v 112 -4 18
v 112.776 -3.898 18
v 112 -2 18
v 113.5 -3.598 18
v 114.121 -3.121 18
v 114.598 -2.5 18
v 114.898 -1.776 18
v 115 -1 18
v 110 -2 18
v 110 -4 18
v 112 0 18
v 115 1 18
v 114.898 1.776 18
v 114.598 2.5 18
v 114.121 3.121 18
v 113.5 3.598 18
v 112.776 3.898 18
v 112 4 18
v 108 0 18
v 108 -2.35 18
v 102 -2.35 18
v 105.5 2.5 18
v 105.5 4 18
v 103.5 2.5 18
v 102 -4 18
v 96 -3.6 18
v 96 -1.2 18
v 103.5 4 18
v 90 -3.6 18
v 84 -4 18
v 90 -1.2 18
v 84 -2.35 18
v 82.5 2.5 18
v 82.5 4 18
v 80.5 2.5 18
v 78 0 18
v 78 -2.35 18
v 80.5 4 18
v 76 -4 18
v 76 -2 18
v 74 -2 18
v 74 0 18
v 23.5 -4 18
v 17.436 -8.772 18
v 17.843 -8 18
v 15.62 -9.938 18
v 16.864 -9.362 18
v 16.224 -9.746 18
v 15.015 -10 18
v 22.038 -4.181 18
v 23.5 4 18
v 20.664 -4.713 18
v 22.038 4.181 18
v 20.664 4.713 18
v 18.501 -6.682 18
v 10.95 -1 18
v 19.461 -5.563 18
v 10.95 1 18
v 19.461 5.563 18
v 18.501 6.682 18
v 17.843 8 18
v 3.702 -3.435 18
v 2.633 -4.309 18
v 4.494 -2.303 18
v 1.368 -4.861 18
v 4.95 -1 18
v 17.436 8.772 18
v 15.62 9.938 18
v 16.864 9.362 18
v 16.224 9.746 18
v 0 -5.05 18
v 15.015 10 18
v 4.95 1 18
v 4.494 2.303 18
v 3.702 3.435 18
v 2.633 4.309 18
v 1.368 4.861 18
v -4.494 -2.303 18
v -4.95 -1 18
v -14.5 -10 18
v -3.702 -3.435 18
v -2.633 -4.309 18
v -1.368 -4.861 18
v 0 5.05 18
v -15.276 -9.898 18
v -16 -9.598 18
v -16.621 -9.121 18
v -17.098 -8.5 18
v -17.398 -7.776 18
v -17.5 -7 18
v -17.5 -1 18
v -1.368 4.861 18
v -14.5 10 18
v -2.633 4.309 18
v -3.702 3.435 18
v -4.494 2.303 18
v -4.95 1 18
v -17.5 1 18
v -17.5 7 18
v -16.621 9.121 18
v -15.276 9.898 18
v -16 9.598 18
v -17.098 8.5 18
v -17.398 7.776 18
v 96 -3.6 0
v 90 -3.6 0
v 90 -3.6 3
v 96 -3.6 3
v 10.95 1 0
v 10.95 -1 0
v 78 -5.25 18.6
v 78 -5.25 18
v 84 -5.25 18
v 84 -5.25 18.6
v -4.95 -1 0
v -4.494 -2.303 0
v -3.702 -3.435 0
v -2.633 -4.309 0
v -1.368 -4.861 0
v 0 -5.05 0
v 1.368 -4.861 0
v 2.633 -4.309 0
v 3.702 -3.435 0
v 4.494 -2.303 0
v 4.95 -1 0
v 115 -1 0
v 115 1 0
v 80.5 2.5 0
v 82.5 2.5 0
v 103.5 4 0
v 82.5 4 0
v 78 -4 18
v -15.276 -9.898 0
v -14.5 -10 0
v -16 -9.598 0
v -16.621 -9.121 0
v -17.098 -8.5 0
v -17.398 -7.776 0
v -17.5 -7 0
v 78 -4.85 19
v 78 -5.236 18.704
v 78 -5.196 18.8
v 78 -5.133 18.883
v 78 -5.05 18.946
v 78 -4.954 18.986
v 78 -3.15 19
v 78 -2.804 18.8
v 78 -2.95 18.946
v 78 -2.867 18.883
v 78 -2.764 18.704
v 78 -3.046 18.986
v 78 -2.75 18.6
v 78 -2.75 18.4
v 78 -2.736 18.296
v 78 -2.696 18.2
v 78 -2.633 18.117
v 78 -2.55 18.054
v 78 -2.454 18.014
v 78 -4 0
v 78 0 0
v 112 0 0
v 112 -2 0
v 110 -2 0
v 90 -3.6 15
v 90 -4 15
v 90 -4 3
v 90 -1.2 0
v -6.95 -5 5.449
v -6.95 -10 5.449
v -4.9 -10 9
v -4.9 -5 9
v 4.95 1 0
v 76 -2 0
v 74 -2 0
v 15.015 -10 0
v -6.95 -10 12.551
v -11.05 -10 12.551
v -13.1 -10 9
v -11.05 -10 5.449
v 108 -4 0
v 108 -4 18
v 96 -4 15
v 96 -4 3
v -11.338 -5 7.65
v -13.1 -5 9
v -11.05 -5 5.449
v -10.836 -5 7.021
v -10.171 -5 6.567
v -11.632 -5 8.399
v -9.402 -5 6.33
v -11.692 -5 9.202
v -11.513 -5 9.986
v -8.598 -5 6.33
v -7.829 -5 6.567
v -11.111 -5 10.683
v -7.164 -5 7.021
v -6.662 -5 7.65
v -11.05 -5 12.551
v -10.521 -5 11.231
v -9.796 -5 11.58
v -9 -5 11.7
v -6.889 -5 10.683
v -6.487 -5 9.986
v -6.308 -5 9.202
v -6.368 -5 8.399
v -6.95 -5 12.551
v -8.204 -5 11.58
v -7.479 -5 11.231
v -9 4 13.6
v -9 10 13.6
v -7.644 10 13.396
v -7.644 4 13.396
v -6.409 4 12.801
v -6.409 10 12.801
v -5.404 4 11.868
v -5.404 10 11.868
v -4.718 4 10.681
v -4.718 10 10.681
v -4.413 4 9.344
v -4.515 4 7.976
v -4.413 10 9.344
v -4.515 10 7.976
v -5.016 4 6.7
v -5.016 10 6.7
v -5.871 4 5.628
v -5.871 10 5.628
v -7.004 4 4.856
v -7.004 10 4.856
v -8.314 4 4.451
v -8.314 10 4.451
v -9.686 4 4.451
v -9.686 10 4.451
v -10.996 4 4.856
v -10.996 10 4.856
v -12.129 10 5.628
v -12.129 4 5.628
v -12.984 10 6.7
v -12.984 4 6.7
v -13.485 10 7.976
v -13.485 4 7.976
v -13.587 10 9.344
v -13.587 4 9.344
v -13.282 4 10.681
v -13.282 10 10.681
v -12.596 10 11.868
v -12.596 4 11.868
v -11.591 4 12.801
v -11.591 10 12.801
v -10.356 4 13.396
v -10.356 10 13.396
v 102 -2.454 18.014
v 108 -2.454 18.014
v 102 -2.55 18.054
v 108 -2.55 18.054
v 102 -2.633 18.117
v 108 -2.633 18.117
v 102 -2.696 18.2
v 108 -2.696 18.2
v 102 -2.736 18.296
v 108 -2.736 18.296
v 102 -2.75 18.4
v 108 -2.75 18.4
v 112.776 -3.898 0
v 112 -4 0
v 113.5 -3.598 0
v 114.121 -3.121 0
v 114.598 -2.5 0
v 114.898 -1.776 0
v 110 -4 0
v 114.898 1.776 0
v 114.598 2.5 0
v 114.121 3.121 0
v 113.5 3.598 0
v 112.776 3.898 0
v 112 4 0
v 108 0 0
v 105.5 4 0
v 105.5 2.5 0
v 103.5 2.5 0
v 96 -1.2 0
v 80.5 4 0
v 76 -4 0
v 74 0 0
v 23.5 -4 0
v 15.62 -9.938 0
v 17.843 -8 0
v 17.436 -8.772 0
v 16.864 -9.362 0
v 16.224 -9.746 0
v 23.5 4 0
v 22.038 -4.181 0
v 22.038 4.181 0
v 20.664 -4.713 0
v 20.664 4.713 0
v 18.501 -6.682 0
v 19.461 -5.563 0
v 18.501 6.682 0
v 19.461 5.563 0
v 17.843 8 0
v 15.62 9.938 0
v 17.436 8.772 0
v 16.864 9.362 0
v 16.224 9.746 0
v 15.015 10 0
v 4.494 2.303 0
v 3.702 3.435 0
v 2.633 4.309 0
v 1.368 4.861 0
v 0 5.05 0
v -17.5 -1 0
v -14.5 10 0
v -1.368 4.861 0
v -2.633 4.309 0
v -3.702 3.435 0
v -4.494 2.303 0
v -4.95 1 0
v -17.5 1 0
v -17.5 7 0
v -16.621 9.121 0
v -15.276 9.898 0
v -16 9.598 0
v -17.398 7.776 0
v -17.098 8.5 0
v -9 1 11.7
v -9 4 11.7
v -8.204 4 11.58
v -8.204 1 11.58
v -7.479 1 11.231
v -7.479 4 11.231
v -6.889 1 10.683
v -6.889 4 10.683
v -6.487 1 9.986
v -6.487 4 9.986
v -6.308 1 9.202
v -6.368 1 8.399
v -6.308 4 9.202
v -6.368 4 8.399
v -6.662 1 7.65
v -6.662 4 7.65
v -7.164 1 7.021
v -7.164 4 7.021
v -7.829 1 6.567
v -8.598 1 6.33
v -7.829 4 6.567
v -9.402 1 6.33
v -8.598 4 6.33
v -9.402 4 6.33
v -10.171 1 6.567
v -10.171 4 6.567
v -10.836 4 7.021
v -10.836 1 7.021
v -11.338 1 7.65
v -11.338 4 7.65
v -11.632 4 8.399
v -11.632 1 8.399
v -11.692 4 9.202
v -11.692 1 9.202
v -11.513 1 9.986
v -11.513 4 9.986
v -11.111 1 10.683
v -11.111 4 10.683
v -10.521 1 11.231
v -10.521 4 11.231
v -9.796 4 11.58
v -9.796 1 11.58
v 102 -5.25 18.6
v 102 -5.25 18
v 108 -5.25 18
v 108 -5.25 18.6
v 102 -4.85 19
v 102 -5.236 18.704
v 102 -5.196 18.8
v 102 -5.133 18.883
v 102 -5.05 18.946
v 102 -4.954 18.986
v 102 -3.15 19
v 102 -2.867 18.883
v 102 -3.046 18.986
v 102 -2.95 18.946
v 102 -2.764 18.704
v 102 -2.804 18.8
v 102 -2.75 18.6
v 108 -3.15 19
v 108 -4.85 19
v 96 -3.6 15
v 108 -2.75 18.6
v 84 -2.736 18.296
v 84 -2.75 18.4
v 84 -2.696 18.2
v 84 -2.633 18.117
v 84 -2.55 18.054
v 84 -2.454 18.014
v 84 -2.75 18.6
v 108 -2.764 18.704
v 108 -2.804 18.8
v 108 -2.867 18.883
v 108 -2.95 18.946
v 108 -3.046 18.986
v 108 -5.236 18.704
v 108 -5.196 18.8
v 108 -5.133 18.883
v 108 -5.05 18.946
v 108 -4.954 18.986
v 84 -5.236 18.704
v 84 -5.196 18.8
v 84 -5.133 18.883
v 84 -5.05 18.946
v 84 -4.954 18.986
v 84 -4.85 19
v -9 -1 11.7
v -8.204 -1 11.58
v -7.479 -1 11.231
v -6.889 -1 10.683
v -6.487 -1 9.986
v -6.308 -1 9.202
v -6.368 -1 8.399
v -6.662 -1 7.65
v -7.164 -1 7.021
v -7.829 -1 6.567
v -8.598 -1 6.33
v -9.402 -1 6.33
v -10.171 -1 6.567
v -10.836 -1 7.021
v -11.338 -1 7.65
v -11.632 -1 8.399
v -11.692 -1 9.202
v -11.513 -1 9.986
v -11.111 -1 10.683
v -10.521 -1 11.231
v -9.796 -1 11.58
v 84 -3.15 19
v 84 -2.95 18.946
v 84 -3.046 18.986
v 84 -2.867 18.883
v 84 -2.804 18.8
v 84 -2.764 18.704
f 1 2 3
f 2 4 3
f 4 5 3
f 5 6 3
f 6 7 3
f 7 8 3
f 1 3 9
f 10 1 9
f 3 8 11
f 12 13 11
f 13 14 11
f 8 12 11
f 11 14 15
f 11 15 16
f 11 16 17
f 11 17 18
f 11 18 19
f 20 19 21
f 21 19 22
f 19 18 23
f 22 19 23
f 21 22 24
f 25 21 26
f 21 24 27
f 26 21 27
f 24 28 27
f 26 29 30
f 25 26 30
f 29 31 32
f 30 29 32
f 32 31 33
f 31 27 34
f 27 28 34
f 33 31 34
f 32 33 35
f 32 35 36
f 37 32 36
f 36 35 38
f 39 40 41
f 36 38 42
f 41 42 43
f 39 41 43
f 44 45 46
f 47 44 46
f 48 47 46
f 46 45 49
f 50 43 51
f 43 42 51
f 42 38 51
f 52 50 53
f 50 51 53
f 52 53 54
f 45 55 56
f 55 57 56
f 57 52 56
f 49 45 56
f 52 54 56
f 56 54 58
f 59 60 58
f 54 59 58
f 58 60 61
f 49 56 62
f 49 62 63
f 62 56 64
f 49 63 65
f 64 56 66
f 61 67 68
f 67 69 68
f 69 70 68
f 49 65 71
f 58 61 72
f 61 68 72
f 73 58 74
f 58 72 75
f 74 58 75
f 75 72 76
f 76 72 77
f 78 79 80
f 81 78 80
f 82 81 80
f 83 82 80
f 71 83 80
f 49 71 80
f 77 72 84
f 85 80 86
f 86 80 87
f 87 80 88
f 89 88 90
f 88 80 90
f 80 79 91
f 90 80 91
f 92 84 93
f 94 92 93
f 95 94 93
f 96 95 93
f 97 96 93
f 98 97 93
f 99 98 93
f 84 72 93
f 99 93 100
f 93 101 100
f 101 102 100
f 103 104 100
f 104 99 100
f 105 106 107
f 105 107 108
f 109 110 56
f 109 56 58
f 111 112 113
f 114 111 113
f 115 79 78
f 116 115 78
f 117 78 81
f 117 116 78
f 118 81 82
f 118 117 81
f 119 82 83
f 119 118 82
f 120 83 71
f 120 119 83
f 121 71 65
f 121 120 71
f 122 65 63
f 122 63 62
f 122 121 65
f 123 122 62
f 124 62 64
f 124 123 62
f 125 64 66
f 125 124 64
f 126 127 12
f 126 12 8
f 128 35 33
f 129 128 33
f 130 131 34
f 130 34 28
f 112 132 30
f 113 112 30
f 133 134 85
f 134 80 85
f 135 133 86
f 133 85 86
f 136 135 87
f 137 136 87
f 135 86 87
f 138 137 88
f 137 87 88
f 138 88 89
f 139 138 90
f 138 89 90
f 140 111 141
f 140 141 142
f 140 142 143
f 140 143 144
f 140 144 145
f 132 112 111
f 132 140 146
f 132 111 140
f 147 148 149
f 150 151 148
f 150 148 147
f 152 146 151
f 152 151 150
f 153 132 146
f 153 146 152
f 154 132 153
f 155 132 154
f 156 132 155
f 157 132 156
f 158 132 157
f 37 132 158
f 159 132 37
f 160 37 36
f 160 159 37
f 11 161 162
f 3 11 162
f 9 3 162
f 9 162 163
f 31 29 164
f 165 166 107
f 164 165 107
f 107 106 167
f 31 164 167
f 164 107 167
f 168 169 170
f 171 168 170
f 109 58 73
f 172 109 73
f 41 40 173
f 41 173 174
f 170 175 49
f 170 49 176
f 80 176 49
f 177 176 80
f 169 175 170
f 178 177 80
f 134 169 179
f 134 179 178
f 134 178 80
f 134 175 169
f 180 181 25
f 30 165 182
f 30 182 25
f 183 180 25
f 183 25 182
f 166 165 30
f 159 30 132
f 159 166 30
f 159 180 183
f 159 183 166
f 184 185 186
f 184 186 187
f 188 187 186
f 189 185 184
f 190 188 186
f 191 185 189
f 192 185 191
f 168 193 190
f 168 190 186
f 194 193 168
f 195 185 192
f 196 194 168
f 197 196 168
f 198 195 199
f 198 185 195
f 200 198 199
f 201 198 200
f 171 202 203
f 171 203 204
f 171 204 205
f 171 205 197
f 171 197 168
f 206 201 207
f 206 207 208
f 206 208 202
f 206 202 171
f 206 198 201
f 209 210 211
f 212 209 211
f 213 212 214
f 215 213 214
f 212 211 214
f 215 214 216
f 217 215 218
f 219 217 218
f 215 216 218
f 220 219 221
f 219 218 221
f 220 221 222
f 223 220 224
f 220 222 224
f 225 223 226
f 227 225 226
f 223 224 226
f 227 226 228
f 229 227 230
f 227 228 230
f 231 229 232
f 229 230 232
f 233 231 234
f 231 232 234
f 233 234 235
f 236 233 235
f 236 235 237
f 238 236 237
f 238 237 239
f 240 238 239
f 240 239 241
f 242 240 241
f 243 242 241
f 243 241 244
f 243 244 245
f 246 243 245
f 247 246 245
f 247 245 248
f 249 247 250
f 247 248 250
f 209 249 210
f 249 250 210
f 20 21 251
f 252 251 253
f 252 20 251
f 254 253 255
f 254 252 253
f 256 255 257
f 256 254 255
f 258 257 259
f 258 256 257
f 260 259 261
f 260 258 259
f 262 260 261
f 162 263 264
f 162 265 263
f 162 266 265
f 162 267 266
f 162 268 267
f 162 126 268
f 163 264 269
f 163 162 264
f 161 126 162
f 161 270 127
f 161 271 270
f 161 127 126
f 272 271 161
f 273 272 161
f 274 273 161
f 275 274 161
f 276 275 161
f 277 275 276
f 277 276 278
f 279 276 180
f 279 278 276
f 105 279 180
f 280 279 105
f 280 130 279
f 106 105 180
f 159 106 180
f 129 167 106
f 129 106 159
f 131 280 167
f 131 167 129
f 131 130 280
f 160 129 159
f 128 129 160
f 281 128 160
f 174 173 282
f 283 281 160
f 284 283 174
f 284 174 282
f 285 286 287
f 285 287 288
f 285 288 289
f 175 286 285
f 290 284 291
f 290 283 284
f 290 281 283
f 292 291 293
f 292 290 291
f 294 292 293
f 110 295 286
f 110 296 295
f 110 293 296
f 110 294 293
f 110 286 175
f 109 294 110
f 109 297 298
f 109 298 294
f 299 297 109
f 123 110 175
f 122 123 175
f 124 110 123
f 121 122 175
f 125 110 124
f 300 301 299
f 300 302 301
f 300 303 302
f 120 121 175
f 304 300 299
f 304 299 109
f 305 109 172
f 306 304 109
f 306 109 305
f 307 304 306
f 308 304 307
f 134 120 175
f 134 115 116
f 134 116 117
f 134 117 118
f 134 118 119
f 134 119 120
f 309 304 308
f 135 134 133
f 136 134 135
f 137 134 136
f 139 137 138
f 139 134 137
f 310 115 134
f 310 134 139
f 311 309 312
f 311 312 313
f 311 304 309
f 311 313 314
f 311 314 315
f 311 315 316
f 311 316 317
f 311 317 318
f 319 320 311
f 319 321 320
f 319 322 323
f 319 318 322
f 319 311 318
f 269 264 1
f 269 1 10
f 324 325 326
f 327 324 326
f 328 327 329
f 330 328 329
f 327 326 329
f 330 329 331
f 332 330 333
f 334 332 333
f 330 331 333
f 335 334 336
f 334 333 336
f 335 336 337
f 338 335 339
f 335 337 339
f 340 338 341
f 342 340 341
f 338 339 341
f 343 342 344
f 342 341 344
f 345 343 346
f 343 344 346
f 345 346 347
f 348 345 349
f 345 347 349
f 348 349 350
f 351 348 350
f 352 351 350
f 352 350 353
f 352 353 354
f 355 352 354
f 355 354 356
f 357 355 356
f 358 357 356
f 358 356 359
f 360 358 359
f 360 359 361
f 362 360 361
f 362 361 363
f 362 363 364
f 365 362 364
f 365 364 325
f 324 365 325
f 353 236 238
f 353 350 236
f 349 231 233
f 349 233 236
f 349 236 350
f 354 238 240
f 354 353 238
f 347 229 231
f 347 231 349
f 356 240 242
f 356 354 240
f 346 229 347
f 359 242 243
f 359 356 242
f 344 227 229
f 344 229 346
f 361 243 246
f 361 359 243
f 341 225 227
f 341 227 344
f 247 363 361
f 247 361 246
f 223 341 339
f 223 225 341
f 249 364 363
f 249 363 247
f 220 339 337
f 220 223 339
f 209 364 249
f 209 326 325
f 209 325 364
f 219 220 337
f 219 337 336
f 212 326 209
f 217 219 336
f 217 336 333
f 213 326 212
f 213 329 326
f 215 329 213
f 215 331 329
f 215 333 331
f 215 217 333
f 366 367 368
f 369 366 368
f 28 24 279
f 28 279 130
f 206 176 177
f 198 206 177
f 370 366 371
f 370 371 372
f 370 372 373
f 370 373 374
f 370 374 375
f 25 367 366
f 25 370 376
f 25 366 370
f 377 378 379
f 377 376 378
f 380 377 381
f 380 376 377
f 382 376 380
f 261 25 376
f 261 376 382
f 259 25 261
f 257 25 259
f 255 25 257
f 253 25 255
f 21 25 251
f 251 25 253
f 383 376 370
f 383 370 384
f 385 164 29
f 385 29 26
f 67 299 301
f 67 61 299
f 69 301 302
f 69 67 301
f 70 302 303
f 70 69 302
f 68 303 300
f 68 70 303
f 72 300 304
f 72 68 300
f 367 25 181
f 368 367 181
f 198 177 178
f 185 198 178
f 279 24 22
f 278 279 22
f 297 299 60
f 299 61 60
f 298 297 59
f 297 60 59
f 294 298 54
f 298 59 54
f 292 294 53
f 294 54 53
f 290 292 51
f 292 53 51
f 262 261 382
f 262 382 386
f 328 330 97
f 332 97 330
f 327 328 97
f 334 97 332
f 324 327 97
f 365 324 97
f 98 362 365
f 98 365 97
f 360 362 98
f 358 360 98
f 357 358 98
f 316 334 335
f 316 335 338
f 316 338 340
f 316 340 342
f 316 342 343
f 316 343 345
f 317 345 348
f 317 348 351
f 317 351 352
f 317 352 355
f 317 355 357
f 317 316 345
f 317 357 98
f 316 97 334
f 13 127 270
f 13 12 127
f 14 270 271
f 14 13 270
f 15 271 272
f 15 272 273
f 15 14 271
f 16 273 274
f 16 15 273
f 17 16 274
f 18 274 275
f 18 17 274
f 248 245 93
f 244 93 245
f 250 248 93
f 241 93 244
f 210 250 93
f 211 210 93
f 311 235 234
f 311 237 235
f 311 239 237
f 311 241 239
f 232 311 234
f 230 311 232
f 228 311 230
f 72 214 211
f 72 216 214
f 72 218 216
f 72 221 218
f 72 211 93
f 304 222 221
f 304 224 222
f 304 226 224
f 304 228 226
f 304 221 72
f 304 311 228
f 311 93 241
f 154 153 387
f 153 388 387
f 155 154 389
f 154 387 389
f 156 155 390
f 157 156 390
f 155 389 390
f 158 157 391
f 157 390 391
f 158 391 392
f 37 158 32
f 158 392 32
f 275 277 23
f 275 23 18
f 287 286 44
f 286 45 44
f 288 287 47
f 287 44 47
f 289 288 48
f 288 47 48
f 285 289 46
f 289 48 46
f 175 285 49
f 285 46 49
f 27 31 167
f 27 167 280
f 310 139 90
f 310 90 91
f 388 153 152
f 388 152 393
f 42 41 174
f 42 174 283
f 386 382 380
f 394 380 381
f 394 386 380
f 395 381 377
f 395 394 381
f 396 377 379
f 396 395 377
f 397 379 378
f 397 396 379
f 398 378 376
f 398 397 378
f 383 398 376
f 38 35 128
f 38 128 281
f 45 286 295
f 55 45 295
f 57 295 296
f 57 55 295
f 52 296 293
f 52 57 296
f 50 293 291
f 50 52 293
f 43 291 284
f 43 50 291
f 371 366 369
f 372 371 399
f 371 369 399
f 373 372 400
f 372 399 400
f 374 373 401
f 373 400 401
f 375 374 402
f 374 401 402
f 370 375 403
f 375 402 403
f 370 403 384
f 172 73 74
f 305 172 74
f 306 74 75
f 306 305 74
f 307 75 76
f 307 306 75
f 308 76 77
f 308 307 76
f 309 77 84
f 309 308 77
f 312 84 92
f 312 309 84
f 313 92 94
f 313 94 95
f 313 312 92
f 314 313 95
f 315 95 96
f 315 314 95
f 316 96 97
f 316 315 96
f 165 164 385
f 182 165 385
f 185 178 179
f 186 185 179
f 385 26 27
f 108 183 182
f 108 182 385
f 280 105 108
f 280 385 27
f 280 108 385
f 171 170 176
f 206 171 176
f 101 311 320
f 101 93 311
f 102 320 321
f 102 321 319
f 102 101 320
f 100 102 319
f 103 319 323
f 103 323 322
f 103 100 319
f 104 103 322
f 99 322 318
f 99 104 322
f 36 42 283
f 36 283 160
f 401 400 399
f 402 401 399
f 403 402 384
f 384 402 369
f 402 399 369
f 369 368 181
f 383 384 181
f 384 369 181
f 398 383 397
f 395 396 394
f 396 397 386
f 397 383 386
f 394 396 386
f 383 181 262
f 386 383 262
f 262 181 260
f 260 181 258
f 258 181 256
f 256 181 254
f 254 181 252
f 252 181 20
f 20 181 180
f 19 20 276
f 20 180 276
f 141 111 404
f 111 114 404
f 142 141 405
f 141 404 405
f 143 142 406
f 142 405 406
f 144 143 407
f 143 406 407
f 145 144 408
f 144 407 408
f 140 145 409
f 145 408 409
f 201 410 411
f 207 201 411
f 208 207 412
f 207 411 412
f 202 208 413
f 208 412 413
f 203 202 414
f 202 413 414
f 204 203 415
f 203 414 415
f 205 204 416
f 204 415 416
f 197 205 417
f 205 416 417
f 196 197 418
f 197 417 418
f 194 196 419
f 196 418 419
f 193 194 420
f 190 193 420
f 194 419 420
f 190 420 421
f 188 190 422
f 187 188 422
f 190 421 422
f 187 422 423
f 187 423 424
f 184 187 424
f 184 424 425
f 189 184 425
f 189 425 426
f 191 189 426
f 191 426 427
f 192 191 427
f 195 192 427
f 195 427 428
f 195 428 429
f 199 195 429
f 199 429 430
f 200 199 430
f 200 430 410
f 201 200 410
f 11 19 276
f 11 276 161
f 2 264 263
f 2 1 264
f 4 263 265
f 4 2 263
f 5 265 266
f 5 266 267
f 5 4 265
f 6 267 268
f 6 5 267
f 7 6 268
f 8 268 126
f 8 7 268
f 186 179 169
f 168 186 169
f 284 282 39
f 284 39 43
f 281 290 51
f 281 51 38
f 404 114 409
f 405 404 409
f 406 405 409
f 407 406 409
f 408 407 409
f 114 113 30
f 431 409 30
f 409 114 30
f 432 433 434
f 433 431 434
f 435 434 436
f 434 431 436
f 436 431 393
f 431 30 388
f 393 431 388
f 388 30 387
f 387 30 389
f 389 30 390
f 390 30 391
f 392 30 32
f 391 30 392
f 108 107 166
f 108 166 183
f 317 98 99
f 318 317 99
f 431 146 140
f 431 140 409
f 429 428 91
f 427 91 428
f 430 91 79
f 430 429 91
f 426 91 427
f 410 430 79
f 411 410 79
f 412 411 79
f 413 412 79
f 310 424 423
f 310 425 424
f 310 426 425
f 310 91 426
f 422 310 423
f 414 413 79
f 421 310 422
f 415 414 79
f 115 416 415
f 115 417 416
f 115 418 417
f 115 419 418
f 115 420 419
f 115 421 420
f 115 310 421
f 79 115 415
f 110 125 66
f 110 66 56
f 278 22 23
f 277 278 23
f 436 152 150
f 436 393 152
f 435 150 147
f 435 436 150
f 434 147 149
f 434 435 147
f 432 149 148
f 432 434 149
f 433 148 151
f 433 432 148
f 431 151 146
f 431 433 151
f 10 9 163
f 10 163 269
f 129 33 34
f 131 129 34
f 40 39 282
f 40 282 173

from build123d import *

# Parameters (mm, degrees)
BEAM_FOOTPRINT_DEPTH          = 18
FILLET1_R                     = 6
FILLET2_R                     = 3
FILLET3_R                     = 3
SKETCH7_R                     = 2.7
M5_BOLT_DEPTH                 = 119.105884826
SKETCH9_W                     = 6
SKETCH9_H                     = 2.8
FS_CUTOUT_DEPTH               = 6
M5_NUT_CUTOUT_DEPTH           = 5
RUBBER_BAND_NOTCH_DEPTH       = 116.784282296
RUBBER_BAND_NOTCH_DEPTH_BACK  = 116.784282296
SKETCH10_W                    = 2
SKETCH10_H                    = 1.5
WIRE_CUTOUT_DEPTH             = 117.404467388
WIRE_CUTOUT_DEPTH_BACK        = 117.404467388
SKETCH13_W                    = 6
SKETCH13_H                    = 2.4
SKETCH15_R                    = 4.6
M5_BOLT_HEAD_DEPTH            = 6
SLIDE_PLATE_CUTOUT_DEPTH      = 117.828934895
SLIDE_PLATE_CUTOUT_DEPTH_BACK = 117.828934895
SKETCH17_W                    = 6
SKETCH17_H                    = 2.5
FS_COVER_STOP_DEPTH           = 1
FILLET4_R                     = 0.4


with BuildPart() as part:
    # Sketch1 → beam footprint (new body)
    with BuildSketch(Plane.XY):
        with BuildLine():
            Line((17.5, -4), (17.5, -10))
            Line((17.5, -10), (-17.5, -10))
            Line((-17.5, -10), (-17.5, -1))
            Line((-17.5, -1), (-4.95, -1))
            ThreePointArc((-4.95, -1), (0, -5.05), (4.95, -1))
            Line((4.95, -1), (10.95, -1))
            Line((10.95, -1), (10.95, 1))
            Line((10.95, 1), (4.95, 1))
            ThreePointArc((4.95, 1), (0, 5.05), (-4.95, 1))
            Line((-4.95, 1), (-17.5, 1))
            Line((-17.5, 1), (-17.5, 10))
            Line((-17.5, 10), (17.5, 10))
            Line((17.5, 10), (17.5, 4))
            Line((17.5, 4), (115, 4))
            Line((115, 4), (115, -4))
            Line((115, -4), (17.5, -4))
        make_face()
    extrude(amount=BEAM_FOOTPRINT_DEPTH)

    # Fillet1
    fillet1_edges = [part.edges().sort_by_distance(p)[0] for p in [
        (17.5, -4, 9),
        (17.5, 4, 9),
    ]]
    fillet(fillet1_edges, radius=FILLET1_R - 0.0001)  # a hair under: the kernel refuses the full size

    # Fillet2
    fillet2_edges = [part.edges().sort_by_distance(p)[0] for p in [
        (17.5, -10, 9),
        (-17.5, -10, 9),
        (-17.5, 10, 9),
        (17.5, 10, 9),
    ]]
    fillet(fillet2_edges, radius=FILLET2_R)

    # Fillet3
    fillet3_edges = [part.edges().sort_by_distance(p)[0] for p in [
        (115, 4, 9),
        (115, -4, 9),
    ]]
    fillet(fillet3_edges, radius=FILLET3_R)

    # Sketch7 → M5 Bolt (cut, through all)
    with BuildSketch(Plane(origin=(0, 10, 0), x_dir=(1, 0, 0), z_dir=(0, 1, 0))):
        with Locations(Location((-9, -9, 0), (0, 0, 270))):
            Circle(SKETCH7_R)
    extrude(amount=-M5_BOLT_DEPTH, mode=Mode.SUBTRACT)

    # Sketch9 → FS Cutout (cut, symmetric)
    with BuildSketch(Plane.XY.offset(9)):
        with Locations((93, -2.6)):
            Rectangle(SKETCH9_W, SKETCH9_H)
    extrude(amount=FS_CUTOUT_DEPTH, both=True, mode=Mode.SUBTRACT)

    # Sketch16 → M5 Nut cutout (cut)
    with BuildSketch(Plane.XZ.offset(10)):
        Polygon((-4.9, 9), (-6.95, 12.550704156), (-11.05, 12.550704156), (-13.1, 9), (-11.05, 5.449295844), (-6.95, 5.449295844), align=None)
    extrude(amount=-M5_NUT_CUTOUT_DEPTH, mode=Mode.SUBTRACT)

    # Sketch10 → Rubber Band Notch (cut, two sides: drawn at the far end of the back side and taken through both)
    with BuildSketch(Plane.XY.offset(9).offset(-RUBBER_BAND_NOTCH_DEPTH_BACK)):
        with Locations((81.5, 3.25)):
            Rectangle(SKETCH10_W, SKETCH10_H)
        with Locations((104.5, 3.25)):
            Rectangle(SKETCH10_W, SKETCH10_H)
    extrude(amount=RUBBER_BAND_NOTCH_DEPTH + RUBBER_BAND_NOTCH_DEPTH_BACK, mode=Mode.SUBTRACT)

    # Sketch13 → Wire Cutout (cut, two sides: drawn at the far end of the back side and taken through both)
    with BuildSketch(Plane.XY.offset(3).offset(-WIRE_CUTOUT_DEPTH_BACK)):
        with Locations((93, -2.4)):
            Rectangle(SKETCH13_W, SKETCH13_H)
    extrude(amount=WIRE_CUTOUT_DEPTH + WIRE_CUTOUT_DEPTH_BACK, mode=Mode.SUBTRACT)

    # Sketch15 → M5 Bolt Head (cut)
    with BuildSketch(Plane(origin=(0, 10, 0), x_dir=(1, 0, 0), z_dir=(0, 1, 0))):
        with Locations(Location((-9, -9, 0), (0, 0, 270))):
            Circle(SKETCH15_R)
    extrude(amount=-M5_BOLT_HEAD_DEPTH, mode=Mode.SUBTRACT)

    # Sketch14 → Slide Plate Cutout (cut, two sides: drawn at the far end of the back side and taken through both)
    with BuildSketch(Plane.XY.offset(18).offset(-SLIDE_PLATE_CUTOUT_DEPTH_BACK)):
        Polygon((108, -4), (108, 0), (112, 0), (112, -2), (110, -2), (110, -4), align=None)
        Polygon((78, -4), (76, -4), (76, -2), (74, -2), (74, 0), (78, 0), align=None)
    extrude(amount=SLIDE_PLATE_CUTOUT_DEPTH + SLIDE_PLATE_CUTOUT_DEPTH_BACK, mode=Mode.SUBTRACT)

    # Sketch17 → FS cover stop (add)
    with BuildSketch(Plane.XY.offset(18)):
        with Locations((81, -4)):
            Rectangle(SKETCH17_W, SKETCH17_H)
        with Locations((105, -4)):
            Rectangle(SKETCH17_W, SKETCH17_H)
    extrude(amount=FS_COVER_STOP_DEPTH)

    # Fillet4
    fillet4_edges = [part.edges().sort_by_distance(p)[0] for p in [
        (81, -2.75, 18),
        (81, -5.25, 19),
        (81, -2.75, 19),
        (105, -2.75, 18),
        (105, -5.25, 19),
        (105, -2.75, 19),
    ]]
    fillet(fillet4_edges, radius=FILLET4_R)


solid = part.part
